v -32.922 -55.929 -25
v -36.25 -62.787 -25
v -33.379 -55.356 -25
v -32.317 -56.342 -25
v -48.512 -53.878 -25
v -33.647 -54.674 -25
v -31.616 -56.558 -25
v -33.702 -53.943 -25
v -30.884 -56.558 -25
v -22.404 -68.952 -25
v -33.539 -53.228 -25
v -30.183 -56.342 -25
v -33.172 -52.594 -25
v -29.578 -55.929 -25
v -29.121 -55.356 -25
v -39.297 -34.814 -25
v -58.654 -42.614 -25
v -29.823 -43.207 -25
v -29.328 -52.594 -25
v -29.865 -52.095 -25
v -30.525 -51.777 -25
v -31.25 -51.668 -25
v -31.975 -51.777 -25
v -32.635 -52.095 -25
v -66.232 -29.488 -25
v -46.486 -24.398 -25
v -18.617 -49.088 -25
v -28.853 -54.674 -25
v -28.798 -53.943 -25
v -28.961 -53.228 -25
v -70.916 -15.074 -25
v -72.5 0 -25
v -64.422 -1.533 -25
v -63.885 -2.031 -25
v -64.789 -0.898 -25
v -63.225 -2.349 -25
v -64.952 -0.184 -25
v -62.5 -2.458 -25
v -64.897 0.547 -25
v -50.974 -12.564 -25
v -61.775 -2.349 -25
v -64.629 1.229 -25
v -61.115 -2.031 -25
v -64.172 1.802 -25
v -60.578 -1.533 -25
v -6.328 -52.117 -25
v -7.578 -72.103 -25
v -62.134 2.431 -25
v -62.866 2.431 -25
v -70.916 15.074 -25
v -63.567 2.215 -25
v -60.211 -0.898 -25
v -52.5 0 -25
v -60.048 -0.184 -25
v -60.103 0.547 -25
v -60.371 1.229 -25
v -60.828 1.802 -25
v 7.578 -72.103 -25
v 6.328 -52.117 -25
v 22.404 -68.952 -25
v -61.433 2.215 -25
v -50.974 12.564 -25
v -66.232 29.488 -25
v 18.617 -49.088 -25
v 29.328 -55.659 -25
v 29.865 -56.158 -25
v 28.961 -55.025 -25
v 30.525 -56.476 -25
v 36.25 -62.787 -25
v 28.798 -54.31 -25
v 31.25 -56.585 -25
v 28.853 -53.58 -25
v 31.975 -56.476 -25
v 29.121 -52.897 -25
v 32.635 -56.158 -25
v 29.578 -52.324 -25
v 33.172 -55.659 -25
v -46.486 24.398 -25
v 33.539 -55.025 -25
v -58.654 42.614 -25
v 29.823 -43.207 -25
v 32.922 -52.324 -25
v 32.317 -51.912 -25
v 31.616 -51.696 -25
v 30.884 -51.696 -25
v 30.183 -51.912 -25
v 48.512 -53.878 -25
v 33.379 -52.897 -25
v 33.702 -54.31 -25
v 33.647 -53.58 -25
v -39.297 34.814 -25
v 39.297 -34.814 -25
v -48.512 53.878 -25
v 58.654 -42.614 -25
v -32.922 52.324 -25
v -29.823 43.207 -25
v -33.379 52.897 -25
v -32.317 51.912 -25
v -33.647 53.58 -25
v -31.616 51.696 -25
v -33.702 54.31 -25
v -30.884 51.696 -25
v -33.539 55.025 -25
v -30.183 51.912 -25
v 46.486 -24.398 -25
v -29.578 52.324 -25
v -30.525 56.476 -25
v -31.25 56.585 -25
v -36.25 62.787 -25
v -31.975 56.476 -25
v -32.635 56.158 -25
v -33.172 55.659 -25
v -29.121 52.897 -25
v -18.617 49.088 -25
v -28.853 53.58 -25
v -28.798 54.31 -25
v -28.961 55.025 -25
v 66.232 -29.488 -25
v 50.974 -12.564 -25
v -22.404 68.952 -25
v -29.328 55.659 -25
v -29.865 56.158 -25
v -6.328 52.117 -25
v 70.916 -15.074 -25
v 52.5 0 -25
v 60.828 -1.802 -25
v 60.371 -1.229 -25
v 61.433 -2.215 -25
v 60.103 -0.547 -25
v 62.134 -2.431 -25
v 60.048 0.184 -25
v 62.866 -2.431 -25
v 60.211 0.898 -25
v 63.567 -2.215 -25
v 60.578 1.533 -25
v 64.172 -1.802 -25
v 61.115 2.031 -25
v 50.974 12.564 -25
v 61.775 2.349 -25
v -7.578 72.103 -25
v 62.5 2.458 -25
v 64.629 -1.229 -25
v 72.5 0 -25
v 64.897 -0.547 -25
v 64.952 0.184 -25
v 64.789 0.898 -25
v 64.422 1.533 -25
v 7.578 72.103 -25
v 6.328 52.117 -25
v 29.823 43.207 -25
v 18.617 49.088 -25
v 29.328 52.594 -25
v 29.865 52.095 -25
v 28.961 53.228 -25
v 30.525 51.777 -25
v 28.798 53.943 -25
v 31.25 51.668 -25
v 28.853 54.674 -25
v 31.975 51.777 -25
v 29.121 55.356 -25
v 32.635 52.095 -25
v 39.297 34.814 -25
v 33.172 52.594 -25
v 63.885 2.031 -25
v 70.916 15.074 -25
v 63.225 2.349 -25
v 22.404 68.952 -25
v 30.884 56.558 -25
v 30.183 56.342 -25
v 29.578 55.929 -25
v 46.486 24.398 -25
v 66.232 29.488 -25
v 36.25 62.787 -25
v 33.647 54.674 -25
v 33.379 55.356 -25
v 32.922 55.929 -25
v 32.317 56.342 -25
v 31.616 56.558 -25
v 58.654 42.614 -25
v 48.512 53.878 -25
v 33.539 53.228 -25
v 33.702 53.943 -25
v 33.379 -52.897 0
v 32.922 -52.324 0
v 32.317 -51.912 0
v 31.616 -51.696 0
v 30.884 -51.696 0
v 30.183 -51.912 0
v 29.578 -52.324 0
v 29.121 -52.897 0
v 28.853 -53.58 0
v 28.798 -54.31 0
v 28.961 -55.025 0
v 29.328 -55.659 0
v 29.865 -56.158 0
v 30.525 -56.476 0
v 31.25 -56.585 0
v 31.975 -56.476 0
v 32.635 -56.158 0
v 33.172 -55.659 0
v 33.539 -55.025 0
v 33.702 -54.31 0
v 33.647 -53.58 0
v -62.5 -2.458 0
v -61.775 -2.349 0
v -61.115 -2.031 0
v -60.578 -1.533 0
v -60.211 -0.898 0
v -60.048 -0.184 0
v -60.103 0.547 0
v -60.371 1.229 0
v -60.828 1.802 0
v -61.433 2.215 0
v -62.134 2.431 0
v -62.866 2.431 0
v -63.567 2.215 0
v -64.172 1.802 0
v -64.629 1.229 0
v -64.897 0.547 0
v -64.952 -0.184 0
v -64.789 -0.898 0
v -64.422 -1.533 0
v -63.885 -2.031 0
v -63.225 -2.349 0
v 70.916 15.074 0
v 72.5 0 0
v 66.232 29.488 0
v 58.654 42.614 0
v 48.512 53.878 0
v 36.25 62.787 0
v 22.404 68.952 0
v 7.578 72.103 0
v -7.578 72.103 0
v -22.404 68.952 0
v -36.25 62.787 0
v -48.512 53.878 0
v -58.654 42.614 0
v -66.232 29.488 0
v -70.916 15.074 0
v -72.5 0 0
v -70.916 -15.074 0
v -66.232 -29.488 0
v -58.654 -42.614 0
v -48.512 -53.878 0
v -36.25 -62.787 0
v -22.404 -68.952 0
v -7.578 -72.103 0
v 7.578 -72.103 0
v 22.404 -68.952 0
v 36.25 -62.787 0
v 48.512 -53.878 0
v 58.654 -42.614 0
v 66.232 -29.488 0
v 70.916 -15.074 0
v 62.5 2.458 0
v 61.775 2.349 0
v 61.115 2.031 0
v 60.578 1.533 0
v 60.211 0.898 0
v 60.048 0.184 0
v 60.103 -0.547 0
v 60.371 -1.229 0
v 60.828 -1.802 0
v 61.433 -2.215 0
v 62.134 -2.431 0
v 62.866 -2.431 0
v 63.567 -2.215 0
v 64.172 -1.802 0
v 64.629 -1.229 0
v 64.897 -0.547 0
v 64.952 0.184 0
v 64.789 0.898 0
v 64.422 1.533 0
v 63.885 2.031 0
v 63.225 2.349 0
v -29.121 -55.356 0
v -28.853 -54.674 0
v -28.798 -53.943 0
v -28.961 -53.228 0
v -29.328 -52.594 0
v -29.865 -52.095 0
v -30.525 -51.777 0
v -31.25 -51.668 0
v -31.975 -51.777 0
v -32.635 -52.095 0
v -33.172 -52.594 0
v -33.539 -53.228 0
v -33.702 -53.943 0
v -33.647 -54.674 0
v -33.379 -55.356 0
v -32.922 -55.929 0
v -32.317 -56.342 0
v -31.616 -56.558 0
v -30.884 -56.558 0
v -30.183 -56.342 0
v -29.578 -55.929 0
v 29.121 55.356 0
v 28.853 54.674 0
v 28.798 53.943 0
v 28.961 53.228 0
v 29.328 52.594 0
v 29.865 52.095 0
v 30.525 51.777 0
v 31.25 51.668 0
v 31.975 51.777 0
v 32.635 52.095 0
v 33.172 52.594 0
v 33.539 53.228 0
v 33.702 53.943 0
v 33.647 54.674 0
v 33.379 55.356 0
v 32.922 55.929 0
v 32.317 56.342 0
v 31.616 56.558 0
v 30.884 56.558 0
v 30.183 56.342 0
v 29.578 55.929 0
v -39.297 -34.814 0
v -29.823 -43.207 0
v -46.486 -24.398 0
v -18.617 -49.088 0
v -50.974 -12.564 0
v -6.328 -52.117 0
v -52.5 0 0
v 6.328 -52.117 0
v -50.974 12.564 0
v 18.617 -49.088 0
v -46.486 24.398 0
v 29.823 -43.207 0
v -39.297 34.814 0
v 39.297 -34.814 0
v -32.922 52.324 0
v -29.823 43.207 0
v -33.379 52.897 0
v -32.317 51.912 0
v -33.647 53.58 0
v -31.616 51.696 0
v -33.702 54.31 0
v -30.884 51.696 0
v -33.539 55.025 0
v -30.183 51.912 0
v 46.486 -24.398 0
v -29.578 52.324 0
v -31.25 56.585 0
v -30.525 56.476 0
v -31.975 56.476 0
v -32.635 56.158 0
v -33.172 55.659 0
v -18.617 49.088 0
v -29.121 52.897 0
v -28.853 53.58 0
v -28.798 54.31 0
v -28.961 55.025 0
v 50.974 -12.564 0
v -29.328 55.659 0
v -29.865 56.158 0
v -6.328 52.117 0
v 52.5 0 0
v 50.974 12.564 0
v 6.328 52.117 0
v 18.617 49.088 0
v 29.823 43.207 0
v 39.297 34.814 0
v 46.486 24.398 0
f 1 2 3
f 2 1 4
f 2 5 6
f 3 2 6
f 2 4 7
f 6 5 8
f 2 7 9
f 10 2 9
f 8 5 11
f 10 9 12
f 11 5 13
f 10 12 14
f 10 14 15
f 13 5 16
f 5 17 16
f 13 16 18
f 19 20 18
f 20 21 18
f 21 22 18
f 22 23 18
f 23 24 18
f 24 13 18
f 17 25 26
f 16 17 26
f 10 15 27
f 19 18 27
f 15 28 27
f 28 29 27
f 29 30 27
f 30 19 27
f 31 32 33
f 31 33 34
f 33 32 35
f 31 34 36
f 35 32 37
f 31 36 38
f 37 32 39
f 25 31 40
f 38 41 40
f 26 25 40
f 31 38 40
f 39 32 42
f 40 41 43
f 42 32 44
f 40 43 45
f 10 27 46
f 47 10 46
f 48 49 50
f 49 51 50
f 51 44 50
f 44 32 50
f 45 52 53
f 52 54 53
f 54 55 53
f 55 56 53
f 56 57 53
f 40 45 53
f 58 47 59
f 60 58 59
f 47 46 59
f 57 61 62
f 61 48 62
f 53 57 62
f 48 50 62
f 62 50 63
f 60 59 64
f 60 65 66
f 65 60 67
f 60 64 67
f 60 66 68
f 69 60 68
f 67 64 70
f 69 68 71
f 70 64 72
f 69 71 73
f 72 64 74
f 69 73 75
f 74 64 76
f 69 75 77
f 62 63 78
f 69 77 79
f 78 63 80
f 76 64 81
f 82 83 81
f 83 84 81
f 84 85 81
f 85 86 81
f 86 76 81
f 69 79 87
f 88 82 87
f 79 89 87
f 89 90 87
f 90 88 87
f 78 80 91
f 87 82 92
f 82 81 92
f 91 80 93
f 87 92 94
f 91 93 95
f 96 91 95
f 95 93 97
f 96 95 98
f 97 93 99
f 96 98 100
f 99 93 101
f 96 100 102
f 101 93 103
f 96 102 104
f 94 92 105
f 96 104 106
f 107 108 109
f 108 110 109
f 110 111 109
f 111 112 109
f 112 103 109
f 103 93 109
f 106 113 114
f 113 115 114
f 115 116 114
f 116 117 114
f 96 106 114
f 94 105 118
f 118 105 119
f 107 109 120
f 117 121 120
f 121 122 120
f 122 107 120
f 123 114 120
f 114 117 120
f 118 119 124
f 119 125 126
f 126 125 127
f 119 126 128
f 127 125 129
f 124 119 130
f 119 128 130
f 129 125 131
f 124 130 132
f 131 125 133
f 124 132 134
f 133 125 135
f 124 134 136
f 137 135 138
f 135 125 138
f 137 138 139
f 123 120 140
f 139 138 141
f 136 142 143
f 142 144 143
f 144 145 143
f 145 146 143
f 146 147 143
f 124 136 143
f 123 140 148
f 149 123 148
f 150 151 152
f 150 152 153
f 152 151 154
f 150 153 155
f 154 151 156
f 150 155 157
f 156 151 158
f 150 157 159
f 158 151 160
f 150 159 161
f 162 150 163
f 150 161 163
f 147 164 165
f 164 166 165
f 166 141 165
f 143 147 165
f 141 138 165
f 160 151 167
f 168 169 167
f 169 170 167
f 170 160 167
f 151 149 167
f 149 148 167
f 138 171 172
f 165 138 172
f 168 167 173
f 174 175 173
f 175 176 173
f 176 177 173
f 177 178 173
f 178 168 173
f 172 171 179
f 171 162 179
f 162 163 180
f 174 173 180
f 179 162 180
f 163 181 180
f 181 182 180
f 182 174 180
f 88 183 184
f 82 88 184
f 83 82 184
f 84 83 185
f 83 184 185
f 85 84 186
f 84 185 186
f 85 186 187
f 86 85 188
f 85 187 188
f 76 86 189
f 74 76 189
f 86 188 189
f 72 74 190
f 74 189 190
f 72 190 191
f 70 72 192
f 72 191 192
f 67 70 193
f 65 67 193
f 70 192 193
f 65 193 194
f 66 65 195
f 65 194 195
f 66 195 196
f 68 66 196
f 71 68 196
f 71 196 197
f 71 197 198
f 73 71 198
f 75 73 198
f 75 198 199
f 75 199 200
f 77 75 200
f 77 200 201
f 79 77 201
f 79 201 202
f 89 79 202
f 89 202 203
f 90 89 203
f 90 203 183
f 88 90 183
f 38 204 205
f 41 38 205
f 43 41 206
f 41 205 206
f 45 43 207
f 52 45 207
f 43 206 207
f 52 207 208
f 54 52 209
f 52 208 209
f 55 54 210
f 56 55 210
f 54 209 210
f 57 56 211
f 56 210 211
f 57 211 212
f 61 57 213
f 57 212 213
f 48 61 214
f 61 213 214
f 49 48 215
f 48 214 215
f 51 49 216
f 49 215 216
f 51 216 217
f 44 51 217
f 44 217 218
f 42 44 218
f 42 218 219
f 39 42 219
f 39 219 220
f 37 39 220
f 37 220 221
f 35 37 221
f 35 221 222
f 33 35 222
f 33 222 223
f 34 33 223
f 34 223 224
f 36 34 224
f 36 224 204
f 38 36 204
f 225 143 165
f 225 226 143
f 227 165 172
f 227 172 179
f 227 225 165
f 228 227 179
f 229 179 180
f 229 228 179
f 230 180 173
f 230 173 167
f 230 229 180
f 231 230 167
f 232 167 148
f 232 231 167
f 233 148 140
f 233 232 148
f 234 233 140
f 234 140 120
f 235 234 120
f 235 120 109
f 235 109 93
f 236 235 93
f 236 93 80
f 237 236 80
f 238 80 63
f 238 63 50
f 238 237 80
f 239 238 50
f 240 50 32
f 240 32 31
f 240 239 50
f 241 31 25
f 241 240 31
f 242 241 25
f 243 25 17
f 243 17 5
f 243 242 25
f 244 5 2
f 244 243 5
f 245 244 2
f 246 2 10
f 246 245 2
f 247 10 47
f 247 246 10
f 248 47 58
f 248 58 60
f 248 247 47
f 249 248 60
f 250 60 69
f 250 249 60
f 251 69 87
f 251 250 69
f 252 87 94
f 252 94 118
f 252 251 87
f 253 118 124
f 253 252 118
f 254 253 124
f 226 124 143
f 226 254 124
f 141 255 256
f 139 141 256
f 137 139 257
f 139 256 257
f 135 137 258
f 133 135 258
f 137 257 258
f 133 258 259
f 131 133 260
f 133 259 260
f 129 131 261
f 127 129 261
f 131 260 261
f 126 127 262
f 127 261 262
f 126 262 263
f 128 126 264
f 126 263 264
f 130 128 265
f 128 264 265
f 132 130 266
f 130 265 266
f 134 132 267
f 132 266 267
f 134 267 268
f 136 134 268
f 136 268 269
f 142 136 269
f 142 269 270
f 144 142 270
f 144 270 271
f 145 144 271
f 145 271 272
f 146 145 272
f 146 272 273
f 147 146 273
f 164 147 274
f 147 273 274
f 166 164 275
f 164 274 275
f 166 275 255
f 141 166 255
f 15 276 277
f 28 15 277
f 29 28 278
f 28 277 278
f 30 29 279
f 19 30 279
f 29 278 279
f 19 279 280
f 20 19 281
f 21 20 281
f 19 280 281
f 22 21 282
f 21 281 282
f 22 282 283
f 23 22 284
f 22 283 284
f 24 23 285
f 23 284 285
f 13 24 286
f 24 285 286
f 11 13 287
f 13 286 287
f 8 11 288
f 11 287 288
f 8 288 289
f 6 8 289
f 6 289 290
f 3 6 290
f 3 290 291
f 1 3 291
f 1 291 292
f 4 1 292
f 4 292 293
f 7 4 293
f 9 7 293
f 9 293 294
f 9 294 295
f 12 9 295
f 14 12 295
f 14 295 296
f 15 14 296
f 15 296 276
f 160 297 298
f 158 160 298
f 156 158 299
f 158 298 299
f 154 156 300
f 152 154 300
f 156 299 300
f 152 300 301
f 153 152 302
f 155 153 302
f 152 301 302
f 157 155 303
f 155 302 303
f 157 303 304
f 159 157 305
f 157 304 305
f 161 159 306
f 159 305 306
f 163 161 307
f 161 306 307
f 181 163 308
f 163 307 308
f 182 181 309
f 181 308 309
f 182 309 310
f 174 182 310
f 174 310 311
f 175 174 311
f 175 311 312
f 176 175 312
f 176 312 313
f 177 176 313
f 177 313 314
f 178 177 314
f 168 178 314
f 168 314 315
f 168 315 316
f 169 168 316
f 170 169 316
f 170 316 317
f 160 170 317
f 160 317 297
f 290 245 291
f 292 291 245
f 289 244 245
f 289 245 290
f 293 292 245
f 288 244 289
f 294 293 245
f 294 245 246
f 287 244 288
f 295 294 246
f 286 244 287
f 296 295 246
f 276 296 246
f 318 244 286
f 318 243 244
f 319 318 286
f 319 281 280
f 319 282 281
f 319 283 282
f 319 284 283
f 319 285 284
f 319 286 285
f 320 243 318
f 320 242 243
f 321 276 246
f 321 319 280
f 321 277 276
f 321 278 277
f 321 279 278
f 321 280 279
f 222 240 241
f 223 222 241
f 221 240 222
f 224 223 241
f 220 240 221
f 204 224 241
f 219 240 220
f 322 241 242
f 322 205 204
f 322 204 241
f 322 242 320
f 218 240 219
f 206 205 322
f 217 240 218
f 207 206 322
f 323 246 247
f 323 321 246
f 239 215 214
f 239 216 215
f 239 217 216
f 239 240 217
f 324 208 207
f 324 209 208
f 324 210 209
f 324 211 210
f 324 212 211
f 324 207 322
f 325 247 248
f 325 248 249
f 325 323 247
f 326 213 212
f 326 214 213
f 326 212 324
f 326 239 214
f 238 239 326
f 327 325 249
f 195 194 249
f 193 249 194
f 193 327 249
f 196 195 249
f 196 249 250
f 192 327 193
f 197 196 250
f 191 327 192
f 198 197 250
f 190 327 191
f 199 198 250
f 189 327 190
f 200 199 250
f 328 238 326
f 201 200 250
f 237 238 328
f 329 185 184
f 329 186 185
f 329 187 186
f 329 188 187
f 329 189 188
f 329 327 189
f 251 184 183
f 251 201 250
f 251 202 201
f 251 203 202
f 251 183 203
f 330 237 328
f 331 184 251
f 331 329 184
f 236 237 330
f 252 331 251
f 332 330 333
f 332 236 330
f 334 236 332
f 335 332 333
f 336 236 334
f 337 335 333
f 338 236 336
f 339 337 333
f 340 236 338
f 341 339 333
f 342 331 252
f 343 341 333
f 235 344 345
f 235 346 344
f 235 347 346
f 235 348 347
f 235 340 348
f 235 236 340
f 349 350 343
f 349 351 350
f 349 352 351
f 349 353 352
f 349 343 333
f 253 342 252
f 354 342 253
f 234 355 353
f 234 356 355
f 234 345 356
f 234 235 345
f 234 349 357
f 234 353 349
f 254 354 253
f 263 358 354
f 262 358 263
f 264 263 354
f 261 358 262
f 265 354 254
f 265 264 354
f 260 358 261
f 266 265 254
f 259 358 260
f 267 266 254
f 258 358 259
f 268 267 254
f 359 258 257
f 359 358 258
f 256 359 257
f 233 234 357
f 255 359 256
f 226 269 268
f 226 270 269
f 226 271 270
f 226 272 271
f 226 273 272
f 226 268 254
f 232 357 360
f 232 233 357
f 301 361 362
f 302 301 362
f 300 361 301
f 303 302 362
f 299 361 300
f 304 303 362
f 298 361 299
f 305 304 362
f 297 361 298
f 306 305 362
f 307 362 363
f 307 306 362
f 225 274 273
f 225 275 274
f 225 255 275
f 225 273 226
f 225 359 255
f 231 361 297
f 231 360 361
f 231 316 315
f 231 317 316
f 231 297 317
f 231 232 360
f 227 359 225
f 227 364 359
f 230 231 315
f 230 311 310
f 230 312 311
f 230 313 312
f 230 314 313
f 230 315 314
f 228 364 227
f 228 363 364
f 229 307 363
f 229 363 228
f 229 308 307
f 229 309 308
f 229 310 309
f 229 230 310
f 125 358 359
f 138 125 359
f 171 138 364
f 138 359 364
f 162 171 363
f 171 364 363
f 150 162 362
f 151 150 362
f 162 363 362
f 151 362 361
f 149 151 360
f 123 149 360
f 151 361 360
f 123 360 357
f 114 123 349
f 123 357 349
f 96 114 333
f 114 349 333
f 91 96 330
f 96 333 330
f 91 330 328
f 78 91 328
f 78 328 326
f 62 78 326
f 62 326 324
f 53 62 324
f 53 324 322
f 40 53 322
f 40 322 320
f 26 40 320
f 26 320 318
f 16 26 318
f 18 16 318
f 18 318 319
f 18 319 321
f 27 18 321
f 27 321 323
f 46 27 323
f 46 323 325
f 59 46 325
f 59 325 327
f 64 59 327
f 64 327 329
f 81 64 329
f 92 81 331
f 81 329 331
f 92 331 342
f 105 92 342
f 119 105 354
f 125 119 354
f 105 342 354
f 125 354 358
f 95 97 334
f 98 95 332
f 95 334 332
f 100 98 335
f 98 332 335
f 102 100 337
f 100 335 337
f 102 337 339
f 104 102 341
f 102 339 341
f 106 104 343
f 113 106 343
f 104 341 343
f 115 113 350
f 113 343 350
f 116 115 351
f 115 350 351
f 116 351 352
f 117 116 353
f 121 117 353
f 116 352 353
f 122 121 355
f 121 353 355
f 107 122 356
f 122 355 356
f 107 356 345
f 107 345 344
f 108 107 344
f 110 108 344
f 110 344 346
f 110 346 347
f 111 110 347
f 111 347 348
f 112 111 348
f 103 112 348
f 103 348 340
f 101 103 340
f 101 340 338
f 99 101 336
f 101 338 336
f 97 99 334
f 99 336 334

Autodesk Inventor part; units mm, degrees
ref_plane "YZ Plane" through (0, 0, 0) normal (1, 0, 0) x (0, 1, 0)
ref_plane "XZ Plane" through (0, 0, 0) normal (0, 1, 0) x (-1, 0, 0)
ref_plane "Płaszczyzna konstrukcyjna1" through (0, 0, 0) normal (0, 0, 1) x (1, 0, 0)
sketch "Szkic1" plane through (0, 0, 0) normal (0, 0, 1) x (1, 0, 0)
  circle A0 centre (0, 0) radius 72.5 projected
  circle A1 centre (0, 0) radius 52.5 projected
extrude "Wyciągnięcie proste1" add sketch "Szkic1" against normal blind 25
sketch "Szkic2" plane through (0, 0, -25) normal (0, 0, -1) x (-1, 0, 0)
  circle A0 centre (0, 0) radius 52.5 projected
  line L0 (-52.5, 0) -> (-72.5, 0)
  circle A1 centre (0, 0) radius 72.5 projected
  circle A2 centre (-62.5, 0) radius 3
  dimension "d2" = 20
  dimension "d3" = 6
hole "Otwór1" at (62.5, 0, -25) direction (0, 0, 1) diameter 4.917 end through all thread size "M6x1" class "6H" standard "ISO Metric profile"
pattern_circular "Szyk kołowy1" count 6 over 360 about axis through (0, 0, -10) along (0, 0, 1) of "Otwór1"
properties material "Stal nierdzewna"
